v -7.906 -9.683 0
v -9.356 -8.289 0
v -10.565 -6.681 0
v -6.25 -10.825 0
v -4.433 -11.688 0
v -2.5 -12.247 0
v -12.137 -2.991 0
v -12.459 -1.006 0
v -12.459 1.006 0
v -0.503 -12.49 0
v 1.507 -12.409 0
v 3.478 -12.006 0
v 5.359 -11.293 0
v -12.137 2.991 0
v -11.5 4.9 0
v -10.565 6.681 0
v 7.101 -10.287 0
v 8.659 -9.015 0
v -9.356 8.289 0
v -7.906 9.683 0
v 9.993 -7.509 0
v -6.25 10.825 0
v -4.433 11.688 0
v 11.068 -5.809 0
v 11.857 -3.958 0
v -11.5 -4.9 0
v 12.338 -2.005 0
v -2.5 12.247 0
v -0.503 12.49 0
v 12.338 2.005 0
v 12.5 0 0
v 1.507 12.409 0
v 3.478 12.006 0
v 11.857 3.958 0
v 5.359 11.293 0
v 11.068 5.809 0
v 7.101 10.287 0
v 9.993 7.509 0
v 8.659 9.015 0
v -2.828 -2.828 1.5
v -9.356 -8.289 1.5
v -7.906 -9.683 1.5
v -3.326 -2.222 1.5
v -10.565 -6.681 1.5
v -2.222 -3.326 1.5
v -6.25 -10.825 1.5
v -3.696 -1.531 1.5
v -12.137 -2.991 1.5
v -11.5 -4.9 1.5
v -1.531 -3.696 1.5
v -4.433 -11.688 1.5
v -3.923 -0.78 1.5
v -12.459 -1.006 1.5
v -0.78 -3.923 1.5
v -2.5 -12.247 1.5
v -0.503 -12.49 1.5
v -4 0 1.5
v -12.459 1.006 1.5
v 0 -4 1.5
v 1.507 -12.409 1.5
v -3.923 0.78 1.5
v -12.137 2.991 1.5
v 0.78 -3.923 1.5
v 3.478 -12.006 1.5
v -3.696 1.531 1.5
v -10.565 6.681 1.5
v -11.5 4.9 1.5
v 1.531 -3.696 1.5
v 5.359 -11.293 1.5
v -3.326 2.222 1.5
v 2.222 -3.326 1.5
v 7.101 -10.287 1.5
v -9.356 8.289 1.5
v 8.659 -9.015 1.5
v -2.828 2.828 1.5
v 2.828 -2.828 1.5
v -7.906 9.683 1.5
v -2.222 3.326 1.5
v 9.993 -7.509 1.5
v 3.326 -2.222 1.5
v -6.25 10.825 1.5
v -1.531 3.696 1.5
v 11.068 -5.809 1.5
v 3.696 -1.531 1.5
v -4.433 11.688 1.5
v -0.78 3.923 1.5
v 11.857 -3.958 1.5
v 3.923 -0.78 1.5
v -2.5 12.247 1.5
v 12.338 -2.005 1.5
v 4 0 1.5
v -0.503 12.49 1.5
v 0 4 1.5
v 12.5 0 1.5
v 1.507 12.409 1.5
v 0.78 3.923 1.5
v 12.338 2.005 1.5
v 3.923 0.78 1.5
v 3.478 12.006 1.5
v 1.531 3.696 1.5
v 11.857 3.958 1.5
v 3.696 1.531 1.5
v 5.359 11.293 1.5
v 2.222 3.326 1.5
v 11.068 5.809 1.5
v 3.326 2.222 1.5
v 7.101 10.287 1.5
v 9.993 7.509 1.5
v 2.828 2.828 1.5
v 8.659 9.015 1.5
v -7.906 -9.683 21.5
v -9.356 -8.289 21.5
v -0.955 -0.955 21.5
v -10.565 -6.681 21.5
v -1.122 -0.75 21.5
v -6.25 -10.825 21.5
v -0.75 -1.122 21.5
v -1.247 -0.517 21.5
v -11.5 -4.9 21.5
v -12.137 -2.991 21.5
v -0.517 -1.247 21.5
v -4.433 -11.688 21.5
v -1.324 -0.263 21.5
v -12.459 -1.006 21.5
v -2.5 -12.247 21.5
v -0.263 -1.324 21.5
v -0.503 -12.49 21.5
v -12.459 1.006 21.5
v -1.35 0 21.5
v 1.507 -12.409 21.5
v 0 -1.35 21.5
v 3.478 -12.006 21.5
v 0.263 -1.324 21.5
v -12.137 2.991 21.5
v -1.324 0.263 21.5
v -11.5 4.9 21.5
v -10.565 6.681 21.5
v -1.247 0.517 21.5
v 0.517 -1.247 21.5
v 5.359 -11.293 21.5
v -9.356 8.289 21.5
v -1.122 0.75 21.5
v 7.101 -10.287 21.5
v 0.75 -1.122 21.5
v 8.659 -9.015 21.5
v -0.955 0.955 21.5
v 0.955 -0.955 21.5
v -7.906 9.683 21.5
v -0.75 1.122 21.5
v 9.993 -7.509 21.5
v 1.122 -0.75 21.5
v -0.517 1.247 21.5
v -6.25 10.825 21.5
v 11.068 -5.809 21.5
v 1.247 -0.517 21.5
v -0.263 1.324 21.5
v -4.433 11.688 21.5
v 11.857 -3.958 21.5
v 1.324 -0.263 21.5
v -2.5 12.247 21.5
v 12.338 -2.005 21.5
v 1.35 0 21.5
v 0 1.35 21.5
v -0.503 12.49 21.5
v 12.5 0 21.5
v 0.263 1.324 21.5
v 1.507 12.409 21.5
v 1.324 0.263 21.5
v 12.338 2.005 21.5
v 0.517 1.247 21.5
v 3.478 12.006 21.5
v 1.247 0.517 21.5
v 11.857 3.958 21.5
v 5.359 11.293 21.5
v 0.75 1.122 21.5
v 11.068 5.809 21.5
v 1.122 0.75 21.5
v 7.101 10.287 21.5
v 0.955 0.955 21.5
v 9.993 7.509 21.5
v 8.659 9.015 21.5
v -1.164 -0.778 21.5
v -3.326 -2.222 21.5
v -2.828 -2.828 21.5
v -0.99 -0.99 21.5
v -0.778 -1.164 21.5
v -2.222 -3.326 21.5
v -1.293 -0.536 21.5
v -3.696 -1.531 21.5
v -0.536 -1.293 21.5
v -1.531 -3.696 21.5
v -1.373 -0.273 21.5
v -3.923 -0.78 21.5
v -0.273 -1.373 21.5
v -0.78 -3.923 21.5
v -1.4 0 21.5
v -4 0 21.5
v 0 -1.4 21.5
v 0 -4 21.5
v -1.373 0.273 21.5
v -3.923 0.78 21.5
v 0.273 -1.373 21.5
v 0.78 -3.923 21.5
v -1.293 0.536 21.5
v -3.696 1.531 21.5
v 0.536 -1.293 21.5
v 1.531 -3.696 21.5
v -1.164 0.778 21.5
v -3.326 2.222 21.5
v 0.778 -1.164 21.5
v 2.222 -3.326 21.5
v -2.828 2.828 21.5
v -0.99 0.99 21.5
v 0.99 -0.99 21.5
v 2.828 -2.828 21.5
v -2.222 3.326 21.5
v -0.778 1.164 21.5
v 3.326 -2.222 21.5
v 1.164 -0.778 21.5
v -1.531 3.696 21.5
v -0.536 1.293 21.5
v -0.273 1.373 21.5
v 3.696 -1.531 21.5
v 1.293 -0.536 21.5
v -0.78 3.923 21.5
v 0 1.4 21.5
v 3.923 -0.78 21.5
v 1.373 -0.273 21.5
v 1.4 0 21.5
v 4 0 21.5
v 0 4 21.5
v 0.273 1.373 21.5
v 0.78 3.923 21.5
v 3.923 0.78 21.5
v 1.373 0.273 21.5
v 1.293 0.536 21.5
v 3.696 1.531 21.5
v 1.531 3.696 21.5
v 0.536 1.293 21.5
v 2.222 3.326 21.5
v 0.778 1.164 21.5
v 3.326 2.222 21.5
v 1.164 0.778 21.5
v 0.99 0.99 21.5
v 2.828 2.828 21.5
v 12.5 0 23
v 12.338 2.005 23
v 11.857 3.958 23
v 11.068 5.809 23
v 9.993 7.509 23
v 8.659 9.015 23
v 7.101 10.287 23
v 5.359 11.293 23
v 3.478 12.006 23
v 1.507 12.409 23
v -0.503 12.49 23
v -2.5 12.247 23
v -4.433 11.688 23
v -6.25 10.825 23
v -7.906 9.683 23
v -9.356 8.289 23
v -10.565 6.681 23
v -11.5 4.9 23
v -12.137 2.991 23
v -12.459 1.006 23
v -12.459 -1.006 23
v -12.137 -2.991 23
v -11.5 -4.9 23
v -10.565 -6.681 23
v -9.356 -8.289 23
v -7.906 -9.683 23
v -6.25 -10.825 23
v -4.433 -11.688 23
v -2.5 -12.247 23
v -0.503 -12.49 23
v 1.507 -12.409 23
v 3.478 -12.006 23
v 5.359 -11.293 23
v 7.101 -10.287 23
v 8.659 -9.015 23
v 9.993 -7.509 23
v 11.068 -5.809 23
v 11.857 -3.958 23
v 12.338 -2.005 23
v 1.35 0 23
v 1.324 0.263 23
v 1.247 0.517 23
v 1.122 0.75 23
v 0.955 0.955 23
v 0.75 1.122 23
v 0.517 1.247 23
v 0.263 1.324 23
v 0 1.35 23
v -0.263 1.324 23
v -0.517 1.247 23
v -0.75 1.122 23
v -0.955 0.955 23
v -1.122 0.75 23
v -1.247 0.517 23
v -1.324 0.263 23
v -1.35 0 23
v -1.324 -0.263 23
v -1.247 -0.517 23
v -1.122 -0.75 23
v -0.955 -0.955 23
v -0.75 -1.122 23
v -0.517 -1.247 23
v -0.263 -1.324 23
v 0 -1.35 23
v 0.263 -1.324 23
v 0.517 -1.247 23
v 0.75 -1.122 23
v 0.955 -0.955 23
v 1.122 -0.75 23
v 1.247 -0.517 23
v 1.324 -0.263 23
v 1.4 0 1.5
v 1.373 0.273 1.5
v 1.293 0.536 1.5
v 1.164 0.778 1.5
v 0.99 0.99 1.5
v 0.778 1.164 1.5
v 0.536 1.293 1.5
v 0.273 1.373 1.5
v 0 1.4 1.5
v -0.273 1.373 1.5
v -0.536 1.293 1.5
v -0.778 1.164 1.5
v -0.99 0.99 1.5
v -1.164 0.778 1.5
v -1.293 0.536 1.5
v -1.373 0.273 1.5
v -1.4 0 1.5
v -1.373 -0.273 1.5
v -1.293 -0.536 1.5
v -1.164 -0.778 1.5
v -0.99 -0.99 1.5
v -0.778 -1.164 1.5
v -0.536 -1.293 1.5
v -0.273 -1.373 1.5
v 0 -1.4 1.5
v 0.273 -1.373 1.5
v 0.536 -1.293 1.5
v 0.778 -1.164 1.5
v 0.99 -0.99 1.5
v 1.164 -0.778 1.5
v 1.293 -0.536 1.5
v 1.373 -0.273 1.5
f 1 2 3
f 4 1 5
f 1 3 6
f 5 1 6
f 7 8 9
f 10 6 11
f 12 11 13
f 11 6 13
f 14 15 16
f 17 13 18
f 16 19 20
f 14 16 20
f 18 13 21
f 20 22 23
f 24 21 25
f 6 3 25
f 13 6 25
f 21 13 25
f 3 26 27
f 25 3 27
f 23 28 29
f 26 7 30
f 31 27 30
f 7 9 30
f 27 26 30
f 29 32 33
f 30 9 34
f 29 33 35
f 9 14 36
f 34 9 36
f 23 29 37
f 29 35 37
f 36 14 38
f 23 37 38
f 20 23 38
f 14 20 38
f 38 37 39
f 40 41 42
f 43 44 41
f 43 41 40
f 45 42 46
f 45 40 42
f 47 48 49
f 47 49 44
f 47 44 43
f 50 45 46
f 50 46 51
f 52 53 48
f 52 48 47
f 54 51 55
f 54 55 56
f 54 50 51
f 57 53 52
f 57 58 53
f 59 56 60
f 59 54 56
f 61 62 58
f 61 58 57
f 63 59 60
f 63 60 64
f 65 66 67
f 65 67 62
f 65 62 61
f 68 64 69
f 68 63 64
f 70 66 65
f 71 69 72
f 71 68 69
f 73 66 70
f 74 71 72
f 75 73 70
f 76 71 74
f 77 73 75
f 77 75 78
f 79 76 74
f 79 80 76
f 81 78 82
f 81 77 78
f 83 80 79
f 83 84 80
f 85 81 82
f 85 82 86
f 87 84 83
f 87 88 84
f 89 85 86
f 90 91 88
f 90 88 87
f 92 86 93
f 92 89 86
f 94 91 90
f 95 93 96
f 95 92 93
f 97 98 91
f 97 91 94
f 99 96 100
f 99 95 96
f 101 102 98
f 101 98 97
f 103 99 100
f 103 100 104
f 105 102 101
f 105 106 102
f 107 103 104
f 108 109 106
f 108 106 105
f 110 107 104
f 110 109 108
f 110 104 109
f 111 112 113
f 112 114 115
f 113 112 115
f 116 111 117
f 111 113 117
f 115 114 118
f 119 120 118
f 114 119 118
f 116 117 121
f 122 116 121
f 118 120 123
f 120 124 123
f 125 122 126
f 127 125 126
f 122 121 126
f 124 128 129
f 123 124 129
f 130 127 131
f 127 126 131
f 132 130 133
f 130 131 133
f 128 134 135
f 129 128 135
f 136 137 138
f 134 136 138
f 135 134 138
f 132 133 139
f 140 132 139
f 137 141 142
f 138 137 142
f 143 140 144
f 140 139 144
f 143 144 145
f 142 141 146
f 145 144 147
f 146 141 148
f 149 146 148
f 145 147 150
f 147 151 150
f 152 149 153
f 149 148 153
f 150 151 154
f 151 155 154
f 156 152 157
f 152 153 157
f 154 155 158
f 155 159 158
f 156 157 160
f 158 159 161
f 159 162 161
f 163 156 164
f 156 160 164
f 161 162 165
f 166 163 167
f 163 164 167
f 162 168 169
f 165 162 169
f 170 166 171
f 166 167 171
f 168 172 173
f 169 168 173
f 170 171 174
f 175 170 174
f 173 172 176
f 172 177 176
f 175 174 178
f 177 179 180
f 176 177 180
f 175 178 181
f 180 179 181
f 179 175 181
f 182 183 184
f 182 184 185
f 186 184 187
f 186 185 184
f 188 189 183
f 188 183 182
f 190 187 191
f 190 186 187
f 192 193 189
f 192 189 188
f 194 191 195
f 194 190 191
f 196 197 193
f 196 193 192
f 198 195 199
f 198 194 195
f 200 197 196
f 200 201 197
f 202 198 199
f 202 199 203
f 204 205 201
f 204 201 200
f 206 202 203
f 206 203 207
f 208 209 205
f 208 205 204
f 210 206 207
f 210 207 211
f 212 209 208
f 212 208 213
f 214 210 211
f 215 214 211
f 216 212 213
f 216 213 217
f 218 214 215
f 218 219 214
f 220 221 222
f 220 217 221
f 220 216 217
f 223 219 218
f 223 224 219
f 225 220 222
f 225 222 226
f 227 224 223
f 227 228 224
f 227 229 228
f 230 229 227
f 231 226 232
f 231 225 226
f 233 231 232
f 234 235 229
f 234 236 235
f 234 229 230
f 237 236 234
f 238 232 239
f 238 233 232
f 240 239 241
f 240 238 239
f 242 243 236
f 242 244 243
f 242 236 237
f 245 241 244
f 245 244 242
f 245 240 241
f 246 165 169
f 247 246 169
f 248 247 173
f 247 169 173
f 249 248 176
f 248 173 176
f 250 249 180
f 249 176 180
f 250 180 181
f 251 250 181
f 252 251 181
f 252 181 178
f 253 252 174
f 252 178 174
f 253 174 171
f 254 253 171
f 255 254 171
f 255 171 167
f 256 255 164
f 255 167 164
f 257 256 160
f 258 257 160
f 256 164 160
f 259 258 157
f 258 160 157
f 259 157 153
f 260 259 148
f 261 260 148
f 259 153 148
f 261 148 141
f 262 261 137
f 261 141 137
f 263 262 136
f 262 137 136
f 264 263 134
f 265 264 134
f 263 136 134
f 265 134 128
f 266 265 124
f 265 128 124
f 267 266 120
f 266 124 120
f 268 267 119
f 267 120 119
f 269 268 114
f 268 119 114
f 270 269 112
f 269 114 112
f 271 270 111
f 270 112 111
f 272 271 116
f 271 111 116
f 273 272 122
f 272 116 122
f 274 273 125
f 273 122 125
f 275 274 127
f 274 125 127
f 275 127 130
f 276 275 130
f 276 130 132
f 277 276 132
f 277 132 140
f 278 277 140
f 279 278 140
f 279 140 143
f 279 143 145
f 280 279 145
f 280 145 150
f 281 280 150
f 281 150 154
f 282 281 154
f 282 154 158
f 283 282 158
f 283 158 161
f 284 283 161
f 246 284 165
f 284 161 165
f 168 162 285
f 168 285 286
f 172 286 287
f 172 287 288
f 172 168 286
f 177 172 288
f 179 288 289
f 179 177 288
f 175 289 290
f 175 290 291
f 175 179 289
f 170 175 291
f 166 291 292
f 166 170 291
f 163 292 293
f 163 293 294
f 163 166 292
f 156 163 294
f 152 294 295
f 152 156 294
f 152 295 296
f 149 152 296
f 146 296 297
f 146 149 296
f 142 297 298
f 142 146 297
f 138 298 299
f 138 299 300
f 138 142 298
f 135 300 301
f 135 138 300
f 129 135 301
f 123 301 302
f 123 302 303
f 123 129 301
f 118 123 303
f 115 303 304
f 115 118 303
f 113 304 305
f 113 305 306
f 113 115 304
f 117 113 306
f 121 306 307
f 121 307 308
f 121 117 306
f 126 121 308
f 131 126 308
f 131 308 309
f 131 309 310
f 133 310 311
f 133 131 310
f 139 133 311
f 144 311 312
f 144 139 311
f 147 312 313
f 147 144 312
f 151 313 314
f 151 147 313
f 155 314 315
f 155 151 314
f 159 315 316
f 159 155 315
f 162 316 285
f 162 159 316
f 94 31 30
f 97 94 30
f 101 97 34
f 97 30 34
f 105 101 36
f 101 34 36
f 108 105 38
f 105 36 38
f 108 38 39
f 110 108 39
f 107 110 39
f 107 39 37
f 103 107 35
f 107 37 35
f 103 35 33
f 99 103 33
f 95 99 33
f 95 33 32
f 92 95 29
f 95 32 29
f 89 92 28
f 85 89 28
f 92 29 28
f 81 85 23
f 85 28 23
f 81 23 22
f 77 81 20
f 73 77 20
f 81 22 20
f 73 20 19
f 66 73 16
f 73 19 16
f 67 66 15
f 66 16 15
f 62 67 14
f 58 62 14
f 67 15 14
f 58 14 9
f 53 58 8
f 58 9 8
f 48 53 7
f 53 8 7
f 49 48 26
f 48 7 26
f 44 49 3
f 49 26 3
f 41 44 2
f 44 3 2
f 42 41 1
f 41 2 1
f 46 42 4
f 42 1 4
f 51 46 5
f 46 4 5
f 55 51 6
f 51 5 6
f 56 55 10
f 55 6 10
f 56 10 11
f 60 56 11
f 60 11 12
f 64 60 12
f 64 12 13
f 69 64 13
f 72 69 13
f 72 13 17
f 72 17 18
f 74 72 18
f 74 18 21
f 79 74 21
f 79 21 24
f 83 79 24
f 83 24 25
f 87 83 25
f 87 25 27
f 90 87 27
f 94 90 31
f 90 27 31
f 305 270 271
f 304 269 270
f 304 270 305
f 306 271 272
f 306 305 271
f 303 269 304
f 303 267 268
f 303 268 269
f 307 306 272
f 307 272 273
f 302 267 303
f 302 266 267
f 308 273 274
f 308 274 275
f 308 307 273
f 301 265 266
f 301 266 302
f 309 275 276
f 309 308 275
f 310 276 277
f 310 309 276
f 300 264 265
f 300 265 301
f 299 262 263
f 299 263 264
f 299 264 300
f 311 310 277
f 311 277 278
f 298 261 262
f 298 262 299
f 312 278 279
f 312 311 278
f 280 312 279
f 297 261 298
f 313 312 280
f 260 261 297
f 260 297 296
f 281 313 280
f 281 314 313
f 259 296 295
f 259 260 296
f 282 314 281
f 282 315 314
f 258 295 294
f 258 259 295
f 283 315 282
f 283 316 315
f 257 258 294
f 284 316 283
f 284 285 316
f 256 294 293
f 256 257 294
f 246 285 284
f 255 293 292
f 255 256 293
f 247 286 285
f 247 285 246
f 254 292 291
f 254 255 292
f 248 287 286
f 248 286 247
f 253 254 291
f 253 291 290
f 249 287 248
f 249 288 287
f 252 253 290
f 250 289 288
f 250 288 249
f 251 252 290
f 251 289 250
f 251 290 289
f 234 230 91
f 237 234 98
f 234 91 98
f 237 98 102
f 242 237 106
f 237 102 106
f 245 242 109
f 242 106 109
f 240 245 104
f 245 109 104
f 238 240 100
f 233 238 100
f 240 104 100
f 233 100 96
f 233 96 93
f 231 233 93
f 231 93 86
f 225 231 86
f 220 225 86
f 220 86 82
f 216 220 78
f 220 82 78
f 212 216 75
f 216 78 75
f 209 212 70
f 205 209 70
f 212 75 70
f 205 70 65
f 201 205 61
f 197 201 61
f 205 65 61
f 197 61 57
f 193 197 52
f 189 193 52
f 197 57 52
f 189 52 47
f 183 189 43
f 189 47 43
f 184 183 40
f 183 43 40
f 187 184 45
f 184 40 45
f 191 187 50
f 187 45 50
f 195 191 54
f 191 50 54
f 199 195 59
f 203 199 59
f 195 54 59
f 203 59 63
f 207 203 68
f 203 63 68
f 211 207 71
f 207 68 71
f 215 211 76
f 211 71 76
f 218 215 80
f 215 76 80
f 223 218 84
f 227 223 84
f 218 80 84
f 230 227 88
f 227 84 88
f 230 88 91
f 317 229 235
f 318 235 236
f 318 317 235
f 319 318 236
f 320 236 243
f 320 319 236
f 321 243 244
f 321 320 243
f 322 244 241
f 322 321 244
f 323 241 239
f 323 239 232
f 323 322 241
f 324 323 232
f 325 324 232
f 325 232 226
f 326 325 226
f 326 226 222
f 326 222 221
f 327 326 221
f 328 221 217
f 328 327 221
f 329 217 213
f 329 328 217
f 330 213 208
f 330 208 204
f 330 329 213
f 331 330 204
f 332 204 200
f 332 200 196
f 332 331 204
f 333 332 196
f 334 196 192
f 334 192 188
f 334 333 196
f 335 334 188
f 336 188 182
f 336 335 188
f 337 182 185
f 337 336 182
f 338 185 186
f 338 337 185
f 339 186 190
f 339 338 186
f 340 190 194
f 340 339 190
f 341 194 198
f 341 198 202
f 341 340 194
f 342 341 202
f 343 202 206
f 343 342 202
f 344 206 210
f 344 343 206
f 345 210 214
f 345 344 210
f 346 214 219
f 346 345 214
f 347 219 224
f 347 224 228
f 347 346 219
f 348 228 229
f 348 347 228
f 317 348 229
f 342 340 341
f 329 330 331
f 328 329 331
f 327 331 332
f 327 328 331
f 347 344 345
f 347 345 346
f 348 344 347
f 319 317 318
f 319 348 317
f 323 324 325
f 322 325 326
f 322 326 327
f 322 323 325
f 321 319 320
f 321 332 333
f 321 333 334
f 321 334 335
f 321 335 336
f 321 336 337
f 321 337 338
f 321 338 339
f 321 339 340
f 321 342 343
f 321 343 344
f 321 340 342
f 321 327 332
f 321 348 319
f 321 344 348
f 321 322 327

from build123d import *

# Parameters (mm, degrees)
F0_R     = 12.5
F1_DEPTH = 1.5
F2_R     = 4
F2_R_2   = 1.4
F3_DEPTH = 20
F4_R     = 12.5
F4_R_2   = 1.35
F5_DEPTH = 1.5


with BuildPart() as f1:
    # F0 (on Top) → F1 (new body)
    with BuildSketch(Plane.XY):
        Circle(F0_R)
    extrude(amount=F1_DEPTH)

    # F2 (on face) → F3 (join)
    with BuildSketch(Plane.XY.offset(1.5)):
        Circle(F2_R)
        Circle(F2_R_2, mode=Mode.SUBTRACT)
    extrude(amount=F3_DEPTH)


with BuildPart() as f5:
    # F4 (on face) → F5 (new body)
    with BuildSketch(Plane.XY.offset(21.5)):
        Circle(F4_R)
        Circle(F4_R_2, mode=Mode.SUBTRACT)
    extrude(amount=F5_DEPTH)


solid = Compound([f1.part, f5.part])
